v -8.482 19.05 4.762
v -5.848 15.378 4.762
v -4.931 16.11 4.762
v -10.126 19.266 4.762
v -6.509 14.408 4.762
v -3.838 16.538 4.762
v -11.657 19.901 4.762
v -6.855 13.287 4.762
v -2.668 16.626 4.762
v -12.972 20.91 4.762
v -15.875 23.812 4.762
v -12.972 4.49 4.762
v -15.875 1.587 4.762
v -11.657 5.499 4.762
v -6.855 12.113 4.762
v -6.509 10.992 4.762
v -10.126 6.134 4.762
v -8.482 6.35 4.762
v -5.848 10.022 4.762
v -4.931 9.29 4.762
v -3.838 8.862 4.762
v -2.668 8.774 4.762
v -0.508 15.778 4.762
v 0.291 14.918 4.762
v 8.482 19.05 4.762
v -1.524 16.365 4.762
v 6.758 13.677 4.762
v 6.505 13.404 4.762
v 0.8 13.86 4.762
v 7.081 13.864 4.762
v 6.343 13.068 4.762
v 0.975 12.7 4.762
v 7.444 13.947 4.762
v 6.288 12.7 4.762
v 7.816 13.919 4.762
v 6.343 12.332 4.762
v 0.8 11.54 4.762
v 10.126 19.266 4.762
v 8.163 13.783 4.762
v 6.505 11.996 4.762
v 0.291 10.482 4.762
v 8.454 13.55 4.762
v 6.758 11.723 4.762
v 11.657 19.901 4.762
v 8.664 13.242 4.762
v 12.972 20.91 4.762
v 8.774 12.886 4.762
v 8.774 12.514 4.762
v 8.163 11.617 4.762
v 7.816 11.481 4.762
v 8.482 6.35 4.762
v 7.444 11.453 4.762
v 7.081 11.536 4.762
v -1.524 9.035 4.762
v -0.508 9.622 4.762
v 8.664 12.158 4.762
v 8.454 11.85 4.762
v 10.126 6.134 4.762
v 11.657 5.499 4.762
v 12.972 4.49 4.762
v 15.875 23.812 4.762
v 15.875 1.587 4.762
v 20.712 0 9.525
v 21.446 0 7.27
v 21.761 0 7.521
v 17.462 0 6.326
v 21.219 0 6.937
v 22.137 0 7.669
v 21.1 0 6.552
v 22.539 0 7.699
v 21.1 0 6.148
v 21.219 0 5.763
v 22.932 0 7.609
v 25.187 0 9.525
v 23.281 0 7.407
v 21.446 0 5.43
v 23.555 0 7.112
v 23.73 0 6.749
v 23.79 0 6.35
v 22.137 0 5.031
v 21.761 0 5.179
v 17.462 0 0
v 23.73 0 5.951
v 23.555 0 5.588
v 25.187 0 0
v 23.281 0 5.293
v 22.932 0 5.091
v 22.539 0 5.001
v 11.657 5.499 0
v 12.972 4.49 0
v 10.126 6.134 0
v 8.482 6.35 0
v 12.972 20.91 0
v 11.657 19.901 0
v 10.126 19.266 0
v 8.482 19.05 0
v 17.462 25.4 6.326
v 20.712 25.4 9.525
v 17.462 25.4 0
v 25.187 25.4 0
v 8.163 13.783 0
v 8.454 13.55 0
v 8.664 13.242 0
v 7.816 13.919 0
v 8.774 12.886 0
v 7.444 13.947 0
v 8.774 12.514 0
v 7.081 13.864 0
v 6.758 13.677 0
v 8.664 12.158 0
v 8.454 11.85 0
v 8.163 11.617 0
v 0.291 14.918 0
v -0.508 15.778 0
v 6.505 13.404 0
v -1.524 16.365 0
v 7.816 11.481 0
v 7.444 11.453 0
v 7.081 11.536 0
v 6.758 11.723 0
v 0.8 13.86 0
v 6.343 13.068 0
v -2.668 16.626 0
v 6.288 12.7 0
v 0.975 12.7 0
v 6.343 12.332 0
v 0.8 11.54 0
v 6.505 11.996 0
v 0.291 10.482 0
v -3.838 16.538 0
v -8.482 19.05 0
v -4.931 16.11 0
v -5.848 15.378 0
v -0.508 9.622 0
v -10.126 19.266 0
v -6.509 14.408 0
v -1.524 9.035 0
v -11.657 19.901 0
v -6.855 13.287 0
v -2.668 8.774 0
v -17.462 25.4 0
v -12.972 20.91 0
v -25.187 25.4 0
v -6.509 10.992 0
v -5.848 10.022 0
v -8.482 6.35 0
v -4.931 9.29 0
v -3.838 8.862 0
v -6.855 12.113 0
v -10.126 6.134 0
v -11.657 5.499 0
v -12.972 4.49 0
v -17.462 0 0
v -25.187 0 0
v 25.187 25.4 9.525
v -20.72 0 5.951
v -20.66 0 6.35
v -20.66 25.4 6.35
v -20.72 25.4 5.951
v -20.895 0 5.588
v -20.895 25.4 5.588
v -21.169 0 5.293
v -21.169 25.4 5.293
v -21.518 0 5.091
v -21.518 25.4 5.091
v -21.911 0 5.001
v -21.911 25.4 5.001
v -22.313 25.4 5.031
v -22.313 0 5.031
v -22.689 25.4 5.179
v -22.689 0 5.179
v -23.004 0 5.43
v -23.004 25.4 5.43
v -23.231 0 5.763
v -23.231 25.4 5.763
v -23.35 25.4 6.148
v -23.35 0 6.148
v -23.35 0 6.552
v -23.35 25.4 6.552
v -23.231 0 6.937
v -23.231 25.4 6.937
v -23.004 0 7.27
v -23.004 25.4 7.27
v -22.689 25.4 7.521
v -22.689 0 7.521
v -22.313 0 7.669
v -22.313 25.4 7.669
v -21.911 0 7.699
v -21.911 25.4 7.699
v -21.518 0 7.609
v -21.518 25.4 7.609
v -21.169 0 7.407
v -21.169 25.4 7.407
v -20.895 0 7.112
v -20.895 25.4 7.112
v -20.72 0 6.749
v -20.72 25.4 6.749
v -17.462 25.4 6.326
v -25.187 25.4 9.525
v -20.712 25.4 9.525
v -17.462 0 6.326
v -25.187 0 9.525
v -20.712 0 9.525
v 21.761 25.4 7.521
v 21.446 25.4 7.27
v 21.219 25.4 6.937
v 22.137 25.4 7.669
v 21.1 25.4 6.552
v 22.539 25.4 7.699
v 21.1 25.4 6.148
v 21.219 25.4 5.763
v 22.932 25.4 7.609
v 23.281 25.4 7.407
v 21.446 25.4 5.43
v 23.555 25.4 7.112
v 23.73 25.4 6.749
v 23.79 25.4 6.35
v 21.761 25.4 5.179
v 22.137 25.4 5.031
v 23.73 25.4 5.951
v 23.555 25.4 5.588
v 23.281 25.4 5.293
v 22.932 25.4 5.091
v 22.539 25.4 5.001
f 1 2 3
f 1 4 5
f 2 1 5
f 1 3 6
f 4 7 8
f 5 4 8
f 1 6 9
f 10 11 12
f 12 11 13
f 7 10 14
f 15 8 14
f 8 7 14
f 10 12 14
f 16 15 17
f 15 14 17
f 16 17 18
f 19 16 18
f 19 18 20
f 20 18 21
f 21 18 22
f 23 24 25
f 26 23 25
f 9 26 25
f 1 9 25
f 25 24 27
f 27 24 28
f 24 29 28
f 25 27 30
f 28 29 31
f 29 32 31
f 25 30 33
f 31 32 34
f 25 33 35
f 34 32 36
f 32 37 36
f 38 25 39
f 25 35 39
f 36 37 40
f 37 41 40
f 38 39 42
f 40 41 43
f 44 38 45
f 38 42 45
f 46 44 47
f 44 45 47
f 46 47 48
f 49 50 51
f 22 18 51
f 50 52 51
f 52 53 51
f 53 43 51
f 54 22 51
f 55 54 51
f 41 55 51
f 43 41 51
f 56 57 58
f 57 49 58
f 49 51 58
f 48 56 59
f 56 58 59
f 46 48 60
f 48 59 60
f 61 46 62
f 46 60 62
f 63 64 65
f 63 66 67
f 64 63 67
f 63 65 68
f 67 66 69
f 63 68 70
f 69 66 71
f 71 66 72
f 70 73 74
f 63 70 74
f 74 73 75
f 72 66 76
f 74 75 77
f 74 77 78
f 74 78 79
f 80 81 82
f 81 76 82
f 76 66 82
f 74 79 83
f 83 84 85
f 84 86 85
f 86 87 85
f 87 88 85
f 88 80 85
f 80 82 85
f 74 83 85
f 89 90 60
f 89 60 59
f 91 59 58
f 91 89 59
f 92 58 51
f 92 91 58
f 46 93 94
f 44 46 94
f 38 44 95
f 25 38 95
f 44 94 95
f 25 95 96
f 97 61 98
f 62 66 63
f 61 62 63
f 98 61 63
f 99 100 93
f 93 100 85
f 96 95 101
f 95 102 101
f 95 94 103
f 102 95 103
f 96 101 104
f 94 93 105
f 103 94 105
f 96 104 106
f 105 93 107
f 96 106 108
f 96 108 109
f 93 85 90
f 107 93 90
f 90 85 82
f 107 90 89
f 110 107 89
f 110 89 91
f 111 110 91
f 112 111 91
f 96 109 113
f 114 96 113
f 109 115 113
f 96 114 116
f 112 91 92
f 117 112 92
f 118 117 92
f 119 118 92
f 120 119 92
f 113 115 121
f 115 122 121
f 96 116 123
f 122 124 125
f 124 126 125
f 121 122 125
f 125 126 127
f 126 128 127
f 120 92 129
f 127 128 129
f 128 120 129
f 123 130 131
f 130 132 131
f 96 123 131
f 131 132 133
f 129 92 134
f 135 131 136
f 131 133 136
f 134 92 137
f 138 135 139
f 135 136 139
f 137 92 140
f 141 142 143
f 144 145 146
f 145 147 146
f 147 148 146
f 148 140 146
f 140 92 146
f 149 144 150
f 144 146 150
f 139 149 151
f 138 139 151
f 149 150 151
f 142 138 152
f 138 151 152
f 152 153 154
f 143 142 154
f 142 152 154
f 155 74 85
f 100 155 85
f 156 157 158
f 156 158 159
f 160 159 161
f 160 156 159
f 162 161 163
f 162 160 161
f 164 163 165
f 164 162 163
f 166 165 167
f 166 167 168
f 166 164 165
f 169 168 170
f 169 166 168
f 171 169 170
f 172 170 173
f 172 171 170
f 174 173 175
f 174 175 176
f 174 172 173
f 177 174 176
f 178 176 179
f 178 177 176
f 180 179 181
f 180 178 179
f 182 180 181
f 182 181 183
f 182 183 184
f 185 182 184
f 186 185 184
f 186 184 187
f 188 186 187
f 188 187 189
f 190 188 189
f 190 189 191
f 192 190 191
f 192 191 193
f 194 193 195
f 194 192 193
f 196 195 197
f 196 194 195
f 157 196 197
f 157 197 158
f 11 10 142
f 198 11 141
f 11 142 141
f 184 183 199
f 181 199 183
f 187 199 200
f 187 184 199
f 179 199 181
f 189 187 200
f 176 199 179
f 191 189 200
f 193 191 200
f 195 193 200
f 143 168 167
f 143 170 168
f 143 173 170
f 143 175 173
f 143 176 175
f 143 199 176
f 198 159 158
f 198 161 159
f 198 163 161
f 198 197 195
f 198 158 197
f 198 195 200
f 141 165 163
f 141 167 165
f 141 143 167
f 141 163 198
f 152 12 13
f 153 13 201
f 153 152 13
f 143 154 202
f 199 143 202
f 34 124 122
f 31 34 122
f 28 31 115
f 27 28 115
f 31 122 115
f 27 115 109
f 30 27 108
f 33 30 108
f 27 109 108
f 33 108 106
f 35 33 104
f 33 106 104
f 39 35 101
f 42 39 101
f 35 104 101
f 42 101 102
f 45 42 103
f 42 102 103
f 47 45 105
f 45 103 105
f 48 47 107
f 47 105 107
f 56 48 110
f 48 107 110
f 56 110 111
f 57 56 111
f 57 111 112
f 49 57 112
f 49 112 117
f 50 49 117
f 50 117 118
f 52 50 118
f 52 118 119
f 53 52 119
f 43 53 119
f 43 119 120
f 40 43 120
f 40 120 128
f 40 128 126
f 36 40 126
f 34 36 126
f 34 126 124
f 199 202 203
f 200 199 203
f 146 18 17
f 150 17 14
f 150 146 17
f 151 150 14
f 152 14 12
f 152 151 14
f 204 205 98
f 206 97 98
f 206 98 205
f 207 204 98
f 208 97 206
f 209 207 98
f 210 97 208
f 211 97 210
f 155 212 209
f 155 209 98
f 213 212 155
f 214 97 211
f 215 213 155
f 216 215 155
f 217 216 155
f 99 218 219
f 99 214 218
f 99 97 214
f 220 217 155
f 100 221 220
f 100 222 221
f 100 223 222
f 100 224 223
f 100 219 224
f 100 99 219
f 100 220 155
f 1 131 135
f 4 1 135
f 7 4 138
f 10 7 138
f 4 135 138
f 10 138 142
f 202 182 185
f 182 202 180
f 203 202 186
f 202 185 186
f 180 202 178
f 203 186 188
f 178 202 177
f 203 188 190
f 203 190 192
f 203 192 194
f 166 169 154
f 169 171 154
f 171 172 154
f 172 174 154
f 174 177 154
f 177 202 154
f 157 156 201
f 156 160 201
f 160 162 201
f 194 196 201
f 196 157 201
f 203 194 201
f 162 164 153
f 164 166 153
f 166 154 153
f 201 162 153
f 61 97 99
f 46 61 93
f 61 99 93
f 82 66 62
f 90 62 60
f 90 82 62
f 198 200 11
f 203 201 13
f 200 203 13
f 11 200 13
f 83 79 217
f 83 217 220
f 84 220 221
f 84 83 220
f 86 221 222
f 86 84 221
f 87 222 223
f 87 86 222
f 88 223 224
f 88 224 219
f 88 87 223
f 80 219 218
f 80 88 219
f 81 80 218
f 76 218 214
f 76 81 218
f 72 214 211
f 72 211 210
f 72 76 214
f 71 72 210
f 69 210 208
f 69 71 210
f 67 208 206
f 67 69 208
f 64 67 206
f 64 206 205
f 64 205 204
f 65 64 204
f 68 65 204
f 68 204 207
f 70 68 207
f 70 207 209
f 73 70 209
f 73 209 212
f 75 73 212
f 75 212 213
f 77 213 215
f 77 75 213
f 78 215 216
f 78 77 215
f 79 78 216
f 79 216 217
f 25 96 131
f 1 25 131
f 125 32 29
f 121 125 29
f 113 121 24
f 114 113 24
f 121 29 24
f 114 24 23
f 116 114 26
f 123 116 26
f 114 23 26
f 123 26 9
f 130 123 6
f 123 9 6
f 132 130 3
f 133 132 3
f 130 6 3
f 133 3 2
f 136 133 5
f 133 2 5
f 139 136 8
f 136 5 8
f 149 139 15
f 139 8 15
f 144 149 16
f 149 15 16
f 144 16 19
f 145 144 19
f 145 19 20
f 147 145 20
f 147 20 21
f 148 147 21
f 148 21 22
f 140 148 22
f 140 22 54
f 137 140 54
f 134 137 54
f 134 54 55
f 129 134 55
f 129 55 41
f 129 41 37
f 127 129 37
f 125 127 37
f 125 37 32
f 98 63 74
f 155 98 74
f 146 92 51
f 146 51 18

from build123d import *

# Parameters (mm, degrees)
SKETCH1_R                 = 1.35255
BOSS_EXTRUDE1_DEPTH       = 25.4
SKETCH2_R                 = 3.937
CUT_EXTRUDE1_DEPTH        = 5.7625
M3X0_5_TAPPED_HOLE1_D     = 2.5
M3X0_5_TAPPED_HOLE1_DEPTH = 4.7625
CUT_EXTRUDE2_DEPTH        = 10.525


with BuildPart() as part:
    # Sketch1 → Boss-Extrude1 (new body)
    with BuildSketch(Plane(origin=(0, 0, 0), x_dir=(1, 0, 0), z_dir=(0, 1, 0))):
        Polygon((25.187315329, 0), (-25.187315329, 0), (-25.187315329, -9.525), (-20.711502729, -9.525), (-15.875, -4.7625), (15.875, -4.7625), (20.711502729, -9.525), (25.187315329, -9.525), align=None)
        with Locations((-22.012315329, -6.35)):
            Circle(SKETCH1_R, mode=Mode.SUBTRACT)
        with Locations((22.437684671, -6.35)):
            Circle(SKETCH1_R, mode=Mode.SUBTRACT)
    extrude(amount=BOSS_EXTRUDE1_DEPTH)

    # Sketch2 → Cut-Extrude1 (cut, through all)
    with BuildSketch(Plane.XY.offset(4.7625)):
        with Locations((-2.962315329, 12.7)):
            Circle(SKETCH2_R)
    extrude(amount=-CUT_EXTRUDE1_DEPTH, mode=Mode.SUBTRACT)

    # M3x0.5 Tapped Hole1
    with Locations(Plane.XY.offset(4.7625)):
        with Locations((7.537684671, 12.7)):
            Hole(M3X0_5_TAPPED_HOLE1_D / 2, depth=M3X0_5_TAPPED_HOLE1_DEPTH)

    # Sketch6 → Cut-Extrude2 (cut, through all)
    with BuildSketch(Plane(origin=(0, 0, 0), x_dir=(-1, 0, 0), z_dir=(0, 0, -1))):
        with BuildLine():
            Line((-17.4625, 25.4), (-12.972371939, 20.909871939))
            ThreePointArc((-12.972371939, 20.909871939), (-10.912283674, 19.533364969), (-8.482243879, 19.05))
            Line((-8.482243879, 19.05), (8.482243879, 19.05))
            ThreePointArc((8.482243879, 19.05), (10.912283674, 19.533364969), (12.972371939, 20.909871939))
            Line((12.972371939, 20.909871939), (17.4625, 25.4))
            Line((17.4625, 25.4), (-17.4625, 25.4))
        make_face()
        with BuildLine():
            Line((-17.4625, 0), (-12.972371939, 4.490128061))
            ThreePointArc((-12.972371939, 4.490128061), (-10.912283674, 5.866635031), (-8.482243879, 6.35))
            Line((-8.482243879, 6.35), (8.482243879, 6.35))
            ThreePointArc((8.482243879, 6.35), (10.912283674, 5.866635031), (12.972371939, 4.490128061))
            Line((12.972371939, 4.490128061), (17.4625, 0))
            Line((17.4625, 0), (-17.4625, 0))
        make_face()
    extrude(amount=-CUT_EXTRUDE2_DEPTH, mode=Mode.SUBTRACT)


solid = part.part
